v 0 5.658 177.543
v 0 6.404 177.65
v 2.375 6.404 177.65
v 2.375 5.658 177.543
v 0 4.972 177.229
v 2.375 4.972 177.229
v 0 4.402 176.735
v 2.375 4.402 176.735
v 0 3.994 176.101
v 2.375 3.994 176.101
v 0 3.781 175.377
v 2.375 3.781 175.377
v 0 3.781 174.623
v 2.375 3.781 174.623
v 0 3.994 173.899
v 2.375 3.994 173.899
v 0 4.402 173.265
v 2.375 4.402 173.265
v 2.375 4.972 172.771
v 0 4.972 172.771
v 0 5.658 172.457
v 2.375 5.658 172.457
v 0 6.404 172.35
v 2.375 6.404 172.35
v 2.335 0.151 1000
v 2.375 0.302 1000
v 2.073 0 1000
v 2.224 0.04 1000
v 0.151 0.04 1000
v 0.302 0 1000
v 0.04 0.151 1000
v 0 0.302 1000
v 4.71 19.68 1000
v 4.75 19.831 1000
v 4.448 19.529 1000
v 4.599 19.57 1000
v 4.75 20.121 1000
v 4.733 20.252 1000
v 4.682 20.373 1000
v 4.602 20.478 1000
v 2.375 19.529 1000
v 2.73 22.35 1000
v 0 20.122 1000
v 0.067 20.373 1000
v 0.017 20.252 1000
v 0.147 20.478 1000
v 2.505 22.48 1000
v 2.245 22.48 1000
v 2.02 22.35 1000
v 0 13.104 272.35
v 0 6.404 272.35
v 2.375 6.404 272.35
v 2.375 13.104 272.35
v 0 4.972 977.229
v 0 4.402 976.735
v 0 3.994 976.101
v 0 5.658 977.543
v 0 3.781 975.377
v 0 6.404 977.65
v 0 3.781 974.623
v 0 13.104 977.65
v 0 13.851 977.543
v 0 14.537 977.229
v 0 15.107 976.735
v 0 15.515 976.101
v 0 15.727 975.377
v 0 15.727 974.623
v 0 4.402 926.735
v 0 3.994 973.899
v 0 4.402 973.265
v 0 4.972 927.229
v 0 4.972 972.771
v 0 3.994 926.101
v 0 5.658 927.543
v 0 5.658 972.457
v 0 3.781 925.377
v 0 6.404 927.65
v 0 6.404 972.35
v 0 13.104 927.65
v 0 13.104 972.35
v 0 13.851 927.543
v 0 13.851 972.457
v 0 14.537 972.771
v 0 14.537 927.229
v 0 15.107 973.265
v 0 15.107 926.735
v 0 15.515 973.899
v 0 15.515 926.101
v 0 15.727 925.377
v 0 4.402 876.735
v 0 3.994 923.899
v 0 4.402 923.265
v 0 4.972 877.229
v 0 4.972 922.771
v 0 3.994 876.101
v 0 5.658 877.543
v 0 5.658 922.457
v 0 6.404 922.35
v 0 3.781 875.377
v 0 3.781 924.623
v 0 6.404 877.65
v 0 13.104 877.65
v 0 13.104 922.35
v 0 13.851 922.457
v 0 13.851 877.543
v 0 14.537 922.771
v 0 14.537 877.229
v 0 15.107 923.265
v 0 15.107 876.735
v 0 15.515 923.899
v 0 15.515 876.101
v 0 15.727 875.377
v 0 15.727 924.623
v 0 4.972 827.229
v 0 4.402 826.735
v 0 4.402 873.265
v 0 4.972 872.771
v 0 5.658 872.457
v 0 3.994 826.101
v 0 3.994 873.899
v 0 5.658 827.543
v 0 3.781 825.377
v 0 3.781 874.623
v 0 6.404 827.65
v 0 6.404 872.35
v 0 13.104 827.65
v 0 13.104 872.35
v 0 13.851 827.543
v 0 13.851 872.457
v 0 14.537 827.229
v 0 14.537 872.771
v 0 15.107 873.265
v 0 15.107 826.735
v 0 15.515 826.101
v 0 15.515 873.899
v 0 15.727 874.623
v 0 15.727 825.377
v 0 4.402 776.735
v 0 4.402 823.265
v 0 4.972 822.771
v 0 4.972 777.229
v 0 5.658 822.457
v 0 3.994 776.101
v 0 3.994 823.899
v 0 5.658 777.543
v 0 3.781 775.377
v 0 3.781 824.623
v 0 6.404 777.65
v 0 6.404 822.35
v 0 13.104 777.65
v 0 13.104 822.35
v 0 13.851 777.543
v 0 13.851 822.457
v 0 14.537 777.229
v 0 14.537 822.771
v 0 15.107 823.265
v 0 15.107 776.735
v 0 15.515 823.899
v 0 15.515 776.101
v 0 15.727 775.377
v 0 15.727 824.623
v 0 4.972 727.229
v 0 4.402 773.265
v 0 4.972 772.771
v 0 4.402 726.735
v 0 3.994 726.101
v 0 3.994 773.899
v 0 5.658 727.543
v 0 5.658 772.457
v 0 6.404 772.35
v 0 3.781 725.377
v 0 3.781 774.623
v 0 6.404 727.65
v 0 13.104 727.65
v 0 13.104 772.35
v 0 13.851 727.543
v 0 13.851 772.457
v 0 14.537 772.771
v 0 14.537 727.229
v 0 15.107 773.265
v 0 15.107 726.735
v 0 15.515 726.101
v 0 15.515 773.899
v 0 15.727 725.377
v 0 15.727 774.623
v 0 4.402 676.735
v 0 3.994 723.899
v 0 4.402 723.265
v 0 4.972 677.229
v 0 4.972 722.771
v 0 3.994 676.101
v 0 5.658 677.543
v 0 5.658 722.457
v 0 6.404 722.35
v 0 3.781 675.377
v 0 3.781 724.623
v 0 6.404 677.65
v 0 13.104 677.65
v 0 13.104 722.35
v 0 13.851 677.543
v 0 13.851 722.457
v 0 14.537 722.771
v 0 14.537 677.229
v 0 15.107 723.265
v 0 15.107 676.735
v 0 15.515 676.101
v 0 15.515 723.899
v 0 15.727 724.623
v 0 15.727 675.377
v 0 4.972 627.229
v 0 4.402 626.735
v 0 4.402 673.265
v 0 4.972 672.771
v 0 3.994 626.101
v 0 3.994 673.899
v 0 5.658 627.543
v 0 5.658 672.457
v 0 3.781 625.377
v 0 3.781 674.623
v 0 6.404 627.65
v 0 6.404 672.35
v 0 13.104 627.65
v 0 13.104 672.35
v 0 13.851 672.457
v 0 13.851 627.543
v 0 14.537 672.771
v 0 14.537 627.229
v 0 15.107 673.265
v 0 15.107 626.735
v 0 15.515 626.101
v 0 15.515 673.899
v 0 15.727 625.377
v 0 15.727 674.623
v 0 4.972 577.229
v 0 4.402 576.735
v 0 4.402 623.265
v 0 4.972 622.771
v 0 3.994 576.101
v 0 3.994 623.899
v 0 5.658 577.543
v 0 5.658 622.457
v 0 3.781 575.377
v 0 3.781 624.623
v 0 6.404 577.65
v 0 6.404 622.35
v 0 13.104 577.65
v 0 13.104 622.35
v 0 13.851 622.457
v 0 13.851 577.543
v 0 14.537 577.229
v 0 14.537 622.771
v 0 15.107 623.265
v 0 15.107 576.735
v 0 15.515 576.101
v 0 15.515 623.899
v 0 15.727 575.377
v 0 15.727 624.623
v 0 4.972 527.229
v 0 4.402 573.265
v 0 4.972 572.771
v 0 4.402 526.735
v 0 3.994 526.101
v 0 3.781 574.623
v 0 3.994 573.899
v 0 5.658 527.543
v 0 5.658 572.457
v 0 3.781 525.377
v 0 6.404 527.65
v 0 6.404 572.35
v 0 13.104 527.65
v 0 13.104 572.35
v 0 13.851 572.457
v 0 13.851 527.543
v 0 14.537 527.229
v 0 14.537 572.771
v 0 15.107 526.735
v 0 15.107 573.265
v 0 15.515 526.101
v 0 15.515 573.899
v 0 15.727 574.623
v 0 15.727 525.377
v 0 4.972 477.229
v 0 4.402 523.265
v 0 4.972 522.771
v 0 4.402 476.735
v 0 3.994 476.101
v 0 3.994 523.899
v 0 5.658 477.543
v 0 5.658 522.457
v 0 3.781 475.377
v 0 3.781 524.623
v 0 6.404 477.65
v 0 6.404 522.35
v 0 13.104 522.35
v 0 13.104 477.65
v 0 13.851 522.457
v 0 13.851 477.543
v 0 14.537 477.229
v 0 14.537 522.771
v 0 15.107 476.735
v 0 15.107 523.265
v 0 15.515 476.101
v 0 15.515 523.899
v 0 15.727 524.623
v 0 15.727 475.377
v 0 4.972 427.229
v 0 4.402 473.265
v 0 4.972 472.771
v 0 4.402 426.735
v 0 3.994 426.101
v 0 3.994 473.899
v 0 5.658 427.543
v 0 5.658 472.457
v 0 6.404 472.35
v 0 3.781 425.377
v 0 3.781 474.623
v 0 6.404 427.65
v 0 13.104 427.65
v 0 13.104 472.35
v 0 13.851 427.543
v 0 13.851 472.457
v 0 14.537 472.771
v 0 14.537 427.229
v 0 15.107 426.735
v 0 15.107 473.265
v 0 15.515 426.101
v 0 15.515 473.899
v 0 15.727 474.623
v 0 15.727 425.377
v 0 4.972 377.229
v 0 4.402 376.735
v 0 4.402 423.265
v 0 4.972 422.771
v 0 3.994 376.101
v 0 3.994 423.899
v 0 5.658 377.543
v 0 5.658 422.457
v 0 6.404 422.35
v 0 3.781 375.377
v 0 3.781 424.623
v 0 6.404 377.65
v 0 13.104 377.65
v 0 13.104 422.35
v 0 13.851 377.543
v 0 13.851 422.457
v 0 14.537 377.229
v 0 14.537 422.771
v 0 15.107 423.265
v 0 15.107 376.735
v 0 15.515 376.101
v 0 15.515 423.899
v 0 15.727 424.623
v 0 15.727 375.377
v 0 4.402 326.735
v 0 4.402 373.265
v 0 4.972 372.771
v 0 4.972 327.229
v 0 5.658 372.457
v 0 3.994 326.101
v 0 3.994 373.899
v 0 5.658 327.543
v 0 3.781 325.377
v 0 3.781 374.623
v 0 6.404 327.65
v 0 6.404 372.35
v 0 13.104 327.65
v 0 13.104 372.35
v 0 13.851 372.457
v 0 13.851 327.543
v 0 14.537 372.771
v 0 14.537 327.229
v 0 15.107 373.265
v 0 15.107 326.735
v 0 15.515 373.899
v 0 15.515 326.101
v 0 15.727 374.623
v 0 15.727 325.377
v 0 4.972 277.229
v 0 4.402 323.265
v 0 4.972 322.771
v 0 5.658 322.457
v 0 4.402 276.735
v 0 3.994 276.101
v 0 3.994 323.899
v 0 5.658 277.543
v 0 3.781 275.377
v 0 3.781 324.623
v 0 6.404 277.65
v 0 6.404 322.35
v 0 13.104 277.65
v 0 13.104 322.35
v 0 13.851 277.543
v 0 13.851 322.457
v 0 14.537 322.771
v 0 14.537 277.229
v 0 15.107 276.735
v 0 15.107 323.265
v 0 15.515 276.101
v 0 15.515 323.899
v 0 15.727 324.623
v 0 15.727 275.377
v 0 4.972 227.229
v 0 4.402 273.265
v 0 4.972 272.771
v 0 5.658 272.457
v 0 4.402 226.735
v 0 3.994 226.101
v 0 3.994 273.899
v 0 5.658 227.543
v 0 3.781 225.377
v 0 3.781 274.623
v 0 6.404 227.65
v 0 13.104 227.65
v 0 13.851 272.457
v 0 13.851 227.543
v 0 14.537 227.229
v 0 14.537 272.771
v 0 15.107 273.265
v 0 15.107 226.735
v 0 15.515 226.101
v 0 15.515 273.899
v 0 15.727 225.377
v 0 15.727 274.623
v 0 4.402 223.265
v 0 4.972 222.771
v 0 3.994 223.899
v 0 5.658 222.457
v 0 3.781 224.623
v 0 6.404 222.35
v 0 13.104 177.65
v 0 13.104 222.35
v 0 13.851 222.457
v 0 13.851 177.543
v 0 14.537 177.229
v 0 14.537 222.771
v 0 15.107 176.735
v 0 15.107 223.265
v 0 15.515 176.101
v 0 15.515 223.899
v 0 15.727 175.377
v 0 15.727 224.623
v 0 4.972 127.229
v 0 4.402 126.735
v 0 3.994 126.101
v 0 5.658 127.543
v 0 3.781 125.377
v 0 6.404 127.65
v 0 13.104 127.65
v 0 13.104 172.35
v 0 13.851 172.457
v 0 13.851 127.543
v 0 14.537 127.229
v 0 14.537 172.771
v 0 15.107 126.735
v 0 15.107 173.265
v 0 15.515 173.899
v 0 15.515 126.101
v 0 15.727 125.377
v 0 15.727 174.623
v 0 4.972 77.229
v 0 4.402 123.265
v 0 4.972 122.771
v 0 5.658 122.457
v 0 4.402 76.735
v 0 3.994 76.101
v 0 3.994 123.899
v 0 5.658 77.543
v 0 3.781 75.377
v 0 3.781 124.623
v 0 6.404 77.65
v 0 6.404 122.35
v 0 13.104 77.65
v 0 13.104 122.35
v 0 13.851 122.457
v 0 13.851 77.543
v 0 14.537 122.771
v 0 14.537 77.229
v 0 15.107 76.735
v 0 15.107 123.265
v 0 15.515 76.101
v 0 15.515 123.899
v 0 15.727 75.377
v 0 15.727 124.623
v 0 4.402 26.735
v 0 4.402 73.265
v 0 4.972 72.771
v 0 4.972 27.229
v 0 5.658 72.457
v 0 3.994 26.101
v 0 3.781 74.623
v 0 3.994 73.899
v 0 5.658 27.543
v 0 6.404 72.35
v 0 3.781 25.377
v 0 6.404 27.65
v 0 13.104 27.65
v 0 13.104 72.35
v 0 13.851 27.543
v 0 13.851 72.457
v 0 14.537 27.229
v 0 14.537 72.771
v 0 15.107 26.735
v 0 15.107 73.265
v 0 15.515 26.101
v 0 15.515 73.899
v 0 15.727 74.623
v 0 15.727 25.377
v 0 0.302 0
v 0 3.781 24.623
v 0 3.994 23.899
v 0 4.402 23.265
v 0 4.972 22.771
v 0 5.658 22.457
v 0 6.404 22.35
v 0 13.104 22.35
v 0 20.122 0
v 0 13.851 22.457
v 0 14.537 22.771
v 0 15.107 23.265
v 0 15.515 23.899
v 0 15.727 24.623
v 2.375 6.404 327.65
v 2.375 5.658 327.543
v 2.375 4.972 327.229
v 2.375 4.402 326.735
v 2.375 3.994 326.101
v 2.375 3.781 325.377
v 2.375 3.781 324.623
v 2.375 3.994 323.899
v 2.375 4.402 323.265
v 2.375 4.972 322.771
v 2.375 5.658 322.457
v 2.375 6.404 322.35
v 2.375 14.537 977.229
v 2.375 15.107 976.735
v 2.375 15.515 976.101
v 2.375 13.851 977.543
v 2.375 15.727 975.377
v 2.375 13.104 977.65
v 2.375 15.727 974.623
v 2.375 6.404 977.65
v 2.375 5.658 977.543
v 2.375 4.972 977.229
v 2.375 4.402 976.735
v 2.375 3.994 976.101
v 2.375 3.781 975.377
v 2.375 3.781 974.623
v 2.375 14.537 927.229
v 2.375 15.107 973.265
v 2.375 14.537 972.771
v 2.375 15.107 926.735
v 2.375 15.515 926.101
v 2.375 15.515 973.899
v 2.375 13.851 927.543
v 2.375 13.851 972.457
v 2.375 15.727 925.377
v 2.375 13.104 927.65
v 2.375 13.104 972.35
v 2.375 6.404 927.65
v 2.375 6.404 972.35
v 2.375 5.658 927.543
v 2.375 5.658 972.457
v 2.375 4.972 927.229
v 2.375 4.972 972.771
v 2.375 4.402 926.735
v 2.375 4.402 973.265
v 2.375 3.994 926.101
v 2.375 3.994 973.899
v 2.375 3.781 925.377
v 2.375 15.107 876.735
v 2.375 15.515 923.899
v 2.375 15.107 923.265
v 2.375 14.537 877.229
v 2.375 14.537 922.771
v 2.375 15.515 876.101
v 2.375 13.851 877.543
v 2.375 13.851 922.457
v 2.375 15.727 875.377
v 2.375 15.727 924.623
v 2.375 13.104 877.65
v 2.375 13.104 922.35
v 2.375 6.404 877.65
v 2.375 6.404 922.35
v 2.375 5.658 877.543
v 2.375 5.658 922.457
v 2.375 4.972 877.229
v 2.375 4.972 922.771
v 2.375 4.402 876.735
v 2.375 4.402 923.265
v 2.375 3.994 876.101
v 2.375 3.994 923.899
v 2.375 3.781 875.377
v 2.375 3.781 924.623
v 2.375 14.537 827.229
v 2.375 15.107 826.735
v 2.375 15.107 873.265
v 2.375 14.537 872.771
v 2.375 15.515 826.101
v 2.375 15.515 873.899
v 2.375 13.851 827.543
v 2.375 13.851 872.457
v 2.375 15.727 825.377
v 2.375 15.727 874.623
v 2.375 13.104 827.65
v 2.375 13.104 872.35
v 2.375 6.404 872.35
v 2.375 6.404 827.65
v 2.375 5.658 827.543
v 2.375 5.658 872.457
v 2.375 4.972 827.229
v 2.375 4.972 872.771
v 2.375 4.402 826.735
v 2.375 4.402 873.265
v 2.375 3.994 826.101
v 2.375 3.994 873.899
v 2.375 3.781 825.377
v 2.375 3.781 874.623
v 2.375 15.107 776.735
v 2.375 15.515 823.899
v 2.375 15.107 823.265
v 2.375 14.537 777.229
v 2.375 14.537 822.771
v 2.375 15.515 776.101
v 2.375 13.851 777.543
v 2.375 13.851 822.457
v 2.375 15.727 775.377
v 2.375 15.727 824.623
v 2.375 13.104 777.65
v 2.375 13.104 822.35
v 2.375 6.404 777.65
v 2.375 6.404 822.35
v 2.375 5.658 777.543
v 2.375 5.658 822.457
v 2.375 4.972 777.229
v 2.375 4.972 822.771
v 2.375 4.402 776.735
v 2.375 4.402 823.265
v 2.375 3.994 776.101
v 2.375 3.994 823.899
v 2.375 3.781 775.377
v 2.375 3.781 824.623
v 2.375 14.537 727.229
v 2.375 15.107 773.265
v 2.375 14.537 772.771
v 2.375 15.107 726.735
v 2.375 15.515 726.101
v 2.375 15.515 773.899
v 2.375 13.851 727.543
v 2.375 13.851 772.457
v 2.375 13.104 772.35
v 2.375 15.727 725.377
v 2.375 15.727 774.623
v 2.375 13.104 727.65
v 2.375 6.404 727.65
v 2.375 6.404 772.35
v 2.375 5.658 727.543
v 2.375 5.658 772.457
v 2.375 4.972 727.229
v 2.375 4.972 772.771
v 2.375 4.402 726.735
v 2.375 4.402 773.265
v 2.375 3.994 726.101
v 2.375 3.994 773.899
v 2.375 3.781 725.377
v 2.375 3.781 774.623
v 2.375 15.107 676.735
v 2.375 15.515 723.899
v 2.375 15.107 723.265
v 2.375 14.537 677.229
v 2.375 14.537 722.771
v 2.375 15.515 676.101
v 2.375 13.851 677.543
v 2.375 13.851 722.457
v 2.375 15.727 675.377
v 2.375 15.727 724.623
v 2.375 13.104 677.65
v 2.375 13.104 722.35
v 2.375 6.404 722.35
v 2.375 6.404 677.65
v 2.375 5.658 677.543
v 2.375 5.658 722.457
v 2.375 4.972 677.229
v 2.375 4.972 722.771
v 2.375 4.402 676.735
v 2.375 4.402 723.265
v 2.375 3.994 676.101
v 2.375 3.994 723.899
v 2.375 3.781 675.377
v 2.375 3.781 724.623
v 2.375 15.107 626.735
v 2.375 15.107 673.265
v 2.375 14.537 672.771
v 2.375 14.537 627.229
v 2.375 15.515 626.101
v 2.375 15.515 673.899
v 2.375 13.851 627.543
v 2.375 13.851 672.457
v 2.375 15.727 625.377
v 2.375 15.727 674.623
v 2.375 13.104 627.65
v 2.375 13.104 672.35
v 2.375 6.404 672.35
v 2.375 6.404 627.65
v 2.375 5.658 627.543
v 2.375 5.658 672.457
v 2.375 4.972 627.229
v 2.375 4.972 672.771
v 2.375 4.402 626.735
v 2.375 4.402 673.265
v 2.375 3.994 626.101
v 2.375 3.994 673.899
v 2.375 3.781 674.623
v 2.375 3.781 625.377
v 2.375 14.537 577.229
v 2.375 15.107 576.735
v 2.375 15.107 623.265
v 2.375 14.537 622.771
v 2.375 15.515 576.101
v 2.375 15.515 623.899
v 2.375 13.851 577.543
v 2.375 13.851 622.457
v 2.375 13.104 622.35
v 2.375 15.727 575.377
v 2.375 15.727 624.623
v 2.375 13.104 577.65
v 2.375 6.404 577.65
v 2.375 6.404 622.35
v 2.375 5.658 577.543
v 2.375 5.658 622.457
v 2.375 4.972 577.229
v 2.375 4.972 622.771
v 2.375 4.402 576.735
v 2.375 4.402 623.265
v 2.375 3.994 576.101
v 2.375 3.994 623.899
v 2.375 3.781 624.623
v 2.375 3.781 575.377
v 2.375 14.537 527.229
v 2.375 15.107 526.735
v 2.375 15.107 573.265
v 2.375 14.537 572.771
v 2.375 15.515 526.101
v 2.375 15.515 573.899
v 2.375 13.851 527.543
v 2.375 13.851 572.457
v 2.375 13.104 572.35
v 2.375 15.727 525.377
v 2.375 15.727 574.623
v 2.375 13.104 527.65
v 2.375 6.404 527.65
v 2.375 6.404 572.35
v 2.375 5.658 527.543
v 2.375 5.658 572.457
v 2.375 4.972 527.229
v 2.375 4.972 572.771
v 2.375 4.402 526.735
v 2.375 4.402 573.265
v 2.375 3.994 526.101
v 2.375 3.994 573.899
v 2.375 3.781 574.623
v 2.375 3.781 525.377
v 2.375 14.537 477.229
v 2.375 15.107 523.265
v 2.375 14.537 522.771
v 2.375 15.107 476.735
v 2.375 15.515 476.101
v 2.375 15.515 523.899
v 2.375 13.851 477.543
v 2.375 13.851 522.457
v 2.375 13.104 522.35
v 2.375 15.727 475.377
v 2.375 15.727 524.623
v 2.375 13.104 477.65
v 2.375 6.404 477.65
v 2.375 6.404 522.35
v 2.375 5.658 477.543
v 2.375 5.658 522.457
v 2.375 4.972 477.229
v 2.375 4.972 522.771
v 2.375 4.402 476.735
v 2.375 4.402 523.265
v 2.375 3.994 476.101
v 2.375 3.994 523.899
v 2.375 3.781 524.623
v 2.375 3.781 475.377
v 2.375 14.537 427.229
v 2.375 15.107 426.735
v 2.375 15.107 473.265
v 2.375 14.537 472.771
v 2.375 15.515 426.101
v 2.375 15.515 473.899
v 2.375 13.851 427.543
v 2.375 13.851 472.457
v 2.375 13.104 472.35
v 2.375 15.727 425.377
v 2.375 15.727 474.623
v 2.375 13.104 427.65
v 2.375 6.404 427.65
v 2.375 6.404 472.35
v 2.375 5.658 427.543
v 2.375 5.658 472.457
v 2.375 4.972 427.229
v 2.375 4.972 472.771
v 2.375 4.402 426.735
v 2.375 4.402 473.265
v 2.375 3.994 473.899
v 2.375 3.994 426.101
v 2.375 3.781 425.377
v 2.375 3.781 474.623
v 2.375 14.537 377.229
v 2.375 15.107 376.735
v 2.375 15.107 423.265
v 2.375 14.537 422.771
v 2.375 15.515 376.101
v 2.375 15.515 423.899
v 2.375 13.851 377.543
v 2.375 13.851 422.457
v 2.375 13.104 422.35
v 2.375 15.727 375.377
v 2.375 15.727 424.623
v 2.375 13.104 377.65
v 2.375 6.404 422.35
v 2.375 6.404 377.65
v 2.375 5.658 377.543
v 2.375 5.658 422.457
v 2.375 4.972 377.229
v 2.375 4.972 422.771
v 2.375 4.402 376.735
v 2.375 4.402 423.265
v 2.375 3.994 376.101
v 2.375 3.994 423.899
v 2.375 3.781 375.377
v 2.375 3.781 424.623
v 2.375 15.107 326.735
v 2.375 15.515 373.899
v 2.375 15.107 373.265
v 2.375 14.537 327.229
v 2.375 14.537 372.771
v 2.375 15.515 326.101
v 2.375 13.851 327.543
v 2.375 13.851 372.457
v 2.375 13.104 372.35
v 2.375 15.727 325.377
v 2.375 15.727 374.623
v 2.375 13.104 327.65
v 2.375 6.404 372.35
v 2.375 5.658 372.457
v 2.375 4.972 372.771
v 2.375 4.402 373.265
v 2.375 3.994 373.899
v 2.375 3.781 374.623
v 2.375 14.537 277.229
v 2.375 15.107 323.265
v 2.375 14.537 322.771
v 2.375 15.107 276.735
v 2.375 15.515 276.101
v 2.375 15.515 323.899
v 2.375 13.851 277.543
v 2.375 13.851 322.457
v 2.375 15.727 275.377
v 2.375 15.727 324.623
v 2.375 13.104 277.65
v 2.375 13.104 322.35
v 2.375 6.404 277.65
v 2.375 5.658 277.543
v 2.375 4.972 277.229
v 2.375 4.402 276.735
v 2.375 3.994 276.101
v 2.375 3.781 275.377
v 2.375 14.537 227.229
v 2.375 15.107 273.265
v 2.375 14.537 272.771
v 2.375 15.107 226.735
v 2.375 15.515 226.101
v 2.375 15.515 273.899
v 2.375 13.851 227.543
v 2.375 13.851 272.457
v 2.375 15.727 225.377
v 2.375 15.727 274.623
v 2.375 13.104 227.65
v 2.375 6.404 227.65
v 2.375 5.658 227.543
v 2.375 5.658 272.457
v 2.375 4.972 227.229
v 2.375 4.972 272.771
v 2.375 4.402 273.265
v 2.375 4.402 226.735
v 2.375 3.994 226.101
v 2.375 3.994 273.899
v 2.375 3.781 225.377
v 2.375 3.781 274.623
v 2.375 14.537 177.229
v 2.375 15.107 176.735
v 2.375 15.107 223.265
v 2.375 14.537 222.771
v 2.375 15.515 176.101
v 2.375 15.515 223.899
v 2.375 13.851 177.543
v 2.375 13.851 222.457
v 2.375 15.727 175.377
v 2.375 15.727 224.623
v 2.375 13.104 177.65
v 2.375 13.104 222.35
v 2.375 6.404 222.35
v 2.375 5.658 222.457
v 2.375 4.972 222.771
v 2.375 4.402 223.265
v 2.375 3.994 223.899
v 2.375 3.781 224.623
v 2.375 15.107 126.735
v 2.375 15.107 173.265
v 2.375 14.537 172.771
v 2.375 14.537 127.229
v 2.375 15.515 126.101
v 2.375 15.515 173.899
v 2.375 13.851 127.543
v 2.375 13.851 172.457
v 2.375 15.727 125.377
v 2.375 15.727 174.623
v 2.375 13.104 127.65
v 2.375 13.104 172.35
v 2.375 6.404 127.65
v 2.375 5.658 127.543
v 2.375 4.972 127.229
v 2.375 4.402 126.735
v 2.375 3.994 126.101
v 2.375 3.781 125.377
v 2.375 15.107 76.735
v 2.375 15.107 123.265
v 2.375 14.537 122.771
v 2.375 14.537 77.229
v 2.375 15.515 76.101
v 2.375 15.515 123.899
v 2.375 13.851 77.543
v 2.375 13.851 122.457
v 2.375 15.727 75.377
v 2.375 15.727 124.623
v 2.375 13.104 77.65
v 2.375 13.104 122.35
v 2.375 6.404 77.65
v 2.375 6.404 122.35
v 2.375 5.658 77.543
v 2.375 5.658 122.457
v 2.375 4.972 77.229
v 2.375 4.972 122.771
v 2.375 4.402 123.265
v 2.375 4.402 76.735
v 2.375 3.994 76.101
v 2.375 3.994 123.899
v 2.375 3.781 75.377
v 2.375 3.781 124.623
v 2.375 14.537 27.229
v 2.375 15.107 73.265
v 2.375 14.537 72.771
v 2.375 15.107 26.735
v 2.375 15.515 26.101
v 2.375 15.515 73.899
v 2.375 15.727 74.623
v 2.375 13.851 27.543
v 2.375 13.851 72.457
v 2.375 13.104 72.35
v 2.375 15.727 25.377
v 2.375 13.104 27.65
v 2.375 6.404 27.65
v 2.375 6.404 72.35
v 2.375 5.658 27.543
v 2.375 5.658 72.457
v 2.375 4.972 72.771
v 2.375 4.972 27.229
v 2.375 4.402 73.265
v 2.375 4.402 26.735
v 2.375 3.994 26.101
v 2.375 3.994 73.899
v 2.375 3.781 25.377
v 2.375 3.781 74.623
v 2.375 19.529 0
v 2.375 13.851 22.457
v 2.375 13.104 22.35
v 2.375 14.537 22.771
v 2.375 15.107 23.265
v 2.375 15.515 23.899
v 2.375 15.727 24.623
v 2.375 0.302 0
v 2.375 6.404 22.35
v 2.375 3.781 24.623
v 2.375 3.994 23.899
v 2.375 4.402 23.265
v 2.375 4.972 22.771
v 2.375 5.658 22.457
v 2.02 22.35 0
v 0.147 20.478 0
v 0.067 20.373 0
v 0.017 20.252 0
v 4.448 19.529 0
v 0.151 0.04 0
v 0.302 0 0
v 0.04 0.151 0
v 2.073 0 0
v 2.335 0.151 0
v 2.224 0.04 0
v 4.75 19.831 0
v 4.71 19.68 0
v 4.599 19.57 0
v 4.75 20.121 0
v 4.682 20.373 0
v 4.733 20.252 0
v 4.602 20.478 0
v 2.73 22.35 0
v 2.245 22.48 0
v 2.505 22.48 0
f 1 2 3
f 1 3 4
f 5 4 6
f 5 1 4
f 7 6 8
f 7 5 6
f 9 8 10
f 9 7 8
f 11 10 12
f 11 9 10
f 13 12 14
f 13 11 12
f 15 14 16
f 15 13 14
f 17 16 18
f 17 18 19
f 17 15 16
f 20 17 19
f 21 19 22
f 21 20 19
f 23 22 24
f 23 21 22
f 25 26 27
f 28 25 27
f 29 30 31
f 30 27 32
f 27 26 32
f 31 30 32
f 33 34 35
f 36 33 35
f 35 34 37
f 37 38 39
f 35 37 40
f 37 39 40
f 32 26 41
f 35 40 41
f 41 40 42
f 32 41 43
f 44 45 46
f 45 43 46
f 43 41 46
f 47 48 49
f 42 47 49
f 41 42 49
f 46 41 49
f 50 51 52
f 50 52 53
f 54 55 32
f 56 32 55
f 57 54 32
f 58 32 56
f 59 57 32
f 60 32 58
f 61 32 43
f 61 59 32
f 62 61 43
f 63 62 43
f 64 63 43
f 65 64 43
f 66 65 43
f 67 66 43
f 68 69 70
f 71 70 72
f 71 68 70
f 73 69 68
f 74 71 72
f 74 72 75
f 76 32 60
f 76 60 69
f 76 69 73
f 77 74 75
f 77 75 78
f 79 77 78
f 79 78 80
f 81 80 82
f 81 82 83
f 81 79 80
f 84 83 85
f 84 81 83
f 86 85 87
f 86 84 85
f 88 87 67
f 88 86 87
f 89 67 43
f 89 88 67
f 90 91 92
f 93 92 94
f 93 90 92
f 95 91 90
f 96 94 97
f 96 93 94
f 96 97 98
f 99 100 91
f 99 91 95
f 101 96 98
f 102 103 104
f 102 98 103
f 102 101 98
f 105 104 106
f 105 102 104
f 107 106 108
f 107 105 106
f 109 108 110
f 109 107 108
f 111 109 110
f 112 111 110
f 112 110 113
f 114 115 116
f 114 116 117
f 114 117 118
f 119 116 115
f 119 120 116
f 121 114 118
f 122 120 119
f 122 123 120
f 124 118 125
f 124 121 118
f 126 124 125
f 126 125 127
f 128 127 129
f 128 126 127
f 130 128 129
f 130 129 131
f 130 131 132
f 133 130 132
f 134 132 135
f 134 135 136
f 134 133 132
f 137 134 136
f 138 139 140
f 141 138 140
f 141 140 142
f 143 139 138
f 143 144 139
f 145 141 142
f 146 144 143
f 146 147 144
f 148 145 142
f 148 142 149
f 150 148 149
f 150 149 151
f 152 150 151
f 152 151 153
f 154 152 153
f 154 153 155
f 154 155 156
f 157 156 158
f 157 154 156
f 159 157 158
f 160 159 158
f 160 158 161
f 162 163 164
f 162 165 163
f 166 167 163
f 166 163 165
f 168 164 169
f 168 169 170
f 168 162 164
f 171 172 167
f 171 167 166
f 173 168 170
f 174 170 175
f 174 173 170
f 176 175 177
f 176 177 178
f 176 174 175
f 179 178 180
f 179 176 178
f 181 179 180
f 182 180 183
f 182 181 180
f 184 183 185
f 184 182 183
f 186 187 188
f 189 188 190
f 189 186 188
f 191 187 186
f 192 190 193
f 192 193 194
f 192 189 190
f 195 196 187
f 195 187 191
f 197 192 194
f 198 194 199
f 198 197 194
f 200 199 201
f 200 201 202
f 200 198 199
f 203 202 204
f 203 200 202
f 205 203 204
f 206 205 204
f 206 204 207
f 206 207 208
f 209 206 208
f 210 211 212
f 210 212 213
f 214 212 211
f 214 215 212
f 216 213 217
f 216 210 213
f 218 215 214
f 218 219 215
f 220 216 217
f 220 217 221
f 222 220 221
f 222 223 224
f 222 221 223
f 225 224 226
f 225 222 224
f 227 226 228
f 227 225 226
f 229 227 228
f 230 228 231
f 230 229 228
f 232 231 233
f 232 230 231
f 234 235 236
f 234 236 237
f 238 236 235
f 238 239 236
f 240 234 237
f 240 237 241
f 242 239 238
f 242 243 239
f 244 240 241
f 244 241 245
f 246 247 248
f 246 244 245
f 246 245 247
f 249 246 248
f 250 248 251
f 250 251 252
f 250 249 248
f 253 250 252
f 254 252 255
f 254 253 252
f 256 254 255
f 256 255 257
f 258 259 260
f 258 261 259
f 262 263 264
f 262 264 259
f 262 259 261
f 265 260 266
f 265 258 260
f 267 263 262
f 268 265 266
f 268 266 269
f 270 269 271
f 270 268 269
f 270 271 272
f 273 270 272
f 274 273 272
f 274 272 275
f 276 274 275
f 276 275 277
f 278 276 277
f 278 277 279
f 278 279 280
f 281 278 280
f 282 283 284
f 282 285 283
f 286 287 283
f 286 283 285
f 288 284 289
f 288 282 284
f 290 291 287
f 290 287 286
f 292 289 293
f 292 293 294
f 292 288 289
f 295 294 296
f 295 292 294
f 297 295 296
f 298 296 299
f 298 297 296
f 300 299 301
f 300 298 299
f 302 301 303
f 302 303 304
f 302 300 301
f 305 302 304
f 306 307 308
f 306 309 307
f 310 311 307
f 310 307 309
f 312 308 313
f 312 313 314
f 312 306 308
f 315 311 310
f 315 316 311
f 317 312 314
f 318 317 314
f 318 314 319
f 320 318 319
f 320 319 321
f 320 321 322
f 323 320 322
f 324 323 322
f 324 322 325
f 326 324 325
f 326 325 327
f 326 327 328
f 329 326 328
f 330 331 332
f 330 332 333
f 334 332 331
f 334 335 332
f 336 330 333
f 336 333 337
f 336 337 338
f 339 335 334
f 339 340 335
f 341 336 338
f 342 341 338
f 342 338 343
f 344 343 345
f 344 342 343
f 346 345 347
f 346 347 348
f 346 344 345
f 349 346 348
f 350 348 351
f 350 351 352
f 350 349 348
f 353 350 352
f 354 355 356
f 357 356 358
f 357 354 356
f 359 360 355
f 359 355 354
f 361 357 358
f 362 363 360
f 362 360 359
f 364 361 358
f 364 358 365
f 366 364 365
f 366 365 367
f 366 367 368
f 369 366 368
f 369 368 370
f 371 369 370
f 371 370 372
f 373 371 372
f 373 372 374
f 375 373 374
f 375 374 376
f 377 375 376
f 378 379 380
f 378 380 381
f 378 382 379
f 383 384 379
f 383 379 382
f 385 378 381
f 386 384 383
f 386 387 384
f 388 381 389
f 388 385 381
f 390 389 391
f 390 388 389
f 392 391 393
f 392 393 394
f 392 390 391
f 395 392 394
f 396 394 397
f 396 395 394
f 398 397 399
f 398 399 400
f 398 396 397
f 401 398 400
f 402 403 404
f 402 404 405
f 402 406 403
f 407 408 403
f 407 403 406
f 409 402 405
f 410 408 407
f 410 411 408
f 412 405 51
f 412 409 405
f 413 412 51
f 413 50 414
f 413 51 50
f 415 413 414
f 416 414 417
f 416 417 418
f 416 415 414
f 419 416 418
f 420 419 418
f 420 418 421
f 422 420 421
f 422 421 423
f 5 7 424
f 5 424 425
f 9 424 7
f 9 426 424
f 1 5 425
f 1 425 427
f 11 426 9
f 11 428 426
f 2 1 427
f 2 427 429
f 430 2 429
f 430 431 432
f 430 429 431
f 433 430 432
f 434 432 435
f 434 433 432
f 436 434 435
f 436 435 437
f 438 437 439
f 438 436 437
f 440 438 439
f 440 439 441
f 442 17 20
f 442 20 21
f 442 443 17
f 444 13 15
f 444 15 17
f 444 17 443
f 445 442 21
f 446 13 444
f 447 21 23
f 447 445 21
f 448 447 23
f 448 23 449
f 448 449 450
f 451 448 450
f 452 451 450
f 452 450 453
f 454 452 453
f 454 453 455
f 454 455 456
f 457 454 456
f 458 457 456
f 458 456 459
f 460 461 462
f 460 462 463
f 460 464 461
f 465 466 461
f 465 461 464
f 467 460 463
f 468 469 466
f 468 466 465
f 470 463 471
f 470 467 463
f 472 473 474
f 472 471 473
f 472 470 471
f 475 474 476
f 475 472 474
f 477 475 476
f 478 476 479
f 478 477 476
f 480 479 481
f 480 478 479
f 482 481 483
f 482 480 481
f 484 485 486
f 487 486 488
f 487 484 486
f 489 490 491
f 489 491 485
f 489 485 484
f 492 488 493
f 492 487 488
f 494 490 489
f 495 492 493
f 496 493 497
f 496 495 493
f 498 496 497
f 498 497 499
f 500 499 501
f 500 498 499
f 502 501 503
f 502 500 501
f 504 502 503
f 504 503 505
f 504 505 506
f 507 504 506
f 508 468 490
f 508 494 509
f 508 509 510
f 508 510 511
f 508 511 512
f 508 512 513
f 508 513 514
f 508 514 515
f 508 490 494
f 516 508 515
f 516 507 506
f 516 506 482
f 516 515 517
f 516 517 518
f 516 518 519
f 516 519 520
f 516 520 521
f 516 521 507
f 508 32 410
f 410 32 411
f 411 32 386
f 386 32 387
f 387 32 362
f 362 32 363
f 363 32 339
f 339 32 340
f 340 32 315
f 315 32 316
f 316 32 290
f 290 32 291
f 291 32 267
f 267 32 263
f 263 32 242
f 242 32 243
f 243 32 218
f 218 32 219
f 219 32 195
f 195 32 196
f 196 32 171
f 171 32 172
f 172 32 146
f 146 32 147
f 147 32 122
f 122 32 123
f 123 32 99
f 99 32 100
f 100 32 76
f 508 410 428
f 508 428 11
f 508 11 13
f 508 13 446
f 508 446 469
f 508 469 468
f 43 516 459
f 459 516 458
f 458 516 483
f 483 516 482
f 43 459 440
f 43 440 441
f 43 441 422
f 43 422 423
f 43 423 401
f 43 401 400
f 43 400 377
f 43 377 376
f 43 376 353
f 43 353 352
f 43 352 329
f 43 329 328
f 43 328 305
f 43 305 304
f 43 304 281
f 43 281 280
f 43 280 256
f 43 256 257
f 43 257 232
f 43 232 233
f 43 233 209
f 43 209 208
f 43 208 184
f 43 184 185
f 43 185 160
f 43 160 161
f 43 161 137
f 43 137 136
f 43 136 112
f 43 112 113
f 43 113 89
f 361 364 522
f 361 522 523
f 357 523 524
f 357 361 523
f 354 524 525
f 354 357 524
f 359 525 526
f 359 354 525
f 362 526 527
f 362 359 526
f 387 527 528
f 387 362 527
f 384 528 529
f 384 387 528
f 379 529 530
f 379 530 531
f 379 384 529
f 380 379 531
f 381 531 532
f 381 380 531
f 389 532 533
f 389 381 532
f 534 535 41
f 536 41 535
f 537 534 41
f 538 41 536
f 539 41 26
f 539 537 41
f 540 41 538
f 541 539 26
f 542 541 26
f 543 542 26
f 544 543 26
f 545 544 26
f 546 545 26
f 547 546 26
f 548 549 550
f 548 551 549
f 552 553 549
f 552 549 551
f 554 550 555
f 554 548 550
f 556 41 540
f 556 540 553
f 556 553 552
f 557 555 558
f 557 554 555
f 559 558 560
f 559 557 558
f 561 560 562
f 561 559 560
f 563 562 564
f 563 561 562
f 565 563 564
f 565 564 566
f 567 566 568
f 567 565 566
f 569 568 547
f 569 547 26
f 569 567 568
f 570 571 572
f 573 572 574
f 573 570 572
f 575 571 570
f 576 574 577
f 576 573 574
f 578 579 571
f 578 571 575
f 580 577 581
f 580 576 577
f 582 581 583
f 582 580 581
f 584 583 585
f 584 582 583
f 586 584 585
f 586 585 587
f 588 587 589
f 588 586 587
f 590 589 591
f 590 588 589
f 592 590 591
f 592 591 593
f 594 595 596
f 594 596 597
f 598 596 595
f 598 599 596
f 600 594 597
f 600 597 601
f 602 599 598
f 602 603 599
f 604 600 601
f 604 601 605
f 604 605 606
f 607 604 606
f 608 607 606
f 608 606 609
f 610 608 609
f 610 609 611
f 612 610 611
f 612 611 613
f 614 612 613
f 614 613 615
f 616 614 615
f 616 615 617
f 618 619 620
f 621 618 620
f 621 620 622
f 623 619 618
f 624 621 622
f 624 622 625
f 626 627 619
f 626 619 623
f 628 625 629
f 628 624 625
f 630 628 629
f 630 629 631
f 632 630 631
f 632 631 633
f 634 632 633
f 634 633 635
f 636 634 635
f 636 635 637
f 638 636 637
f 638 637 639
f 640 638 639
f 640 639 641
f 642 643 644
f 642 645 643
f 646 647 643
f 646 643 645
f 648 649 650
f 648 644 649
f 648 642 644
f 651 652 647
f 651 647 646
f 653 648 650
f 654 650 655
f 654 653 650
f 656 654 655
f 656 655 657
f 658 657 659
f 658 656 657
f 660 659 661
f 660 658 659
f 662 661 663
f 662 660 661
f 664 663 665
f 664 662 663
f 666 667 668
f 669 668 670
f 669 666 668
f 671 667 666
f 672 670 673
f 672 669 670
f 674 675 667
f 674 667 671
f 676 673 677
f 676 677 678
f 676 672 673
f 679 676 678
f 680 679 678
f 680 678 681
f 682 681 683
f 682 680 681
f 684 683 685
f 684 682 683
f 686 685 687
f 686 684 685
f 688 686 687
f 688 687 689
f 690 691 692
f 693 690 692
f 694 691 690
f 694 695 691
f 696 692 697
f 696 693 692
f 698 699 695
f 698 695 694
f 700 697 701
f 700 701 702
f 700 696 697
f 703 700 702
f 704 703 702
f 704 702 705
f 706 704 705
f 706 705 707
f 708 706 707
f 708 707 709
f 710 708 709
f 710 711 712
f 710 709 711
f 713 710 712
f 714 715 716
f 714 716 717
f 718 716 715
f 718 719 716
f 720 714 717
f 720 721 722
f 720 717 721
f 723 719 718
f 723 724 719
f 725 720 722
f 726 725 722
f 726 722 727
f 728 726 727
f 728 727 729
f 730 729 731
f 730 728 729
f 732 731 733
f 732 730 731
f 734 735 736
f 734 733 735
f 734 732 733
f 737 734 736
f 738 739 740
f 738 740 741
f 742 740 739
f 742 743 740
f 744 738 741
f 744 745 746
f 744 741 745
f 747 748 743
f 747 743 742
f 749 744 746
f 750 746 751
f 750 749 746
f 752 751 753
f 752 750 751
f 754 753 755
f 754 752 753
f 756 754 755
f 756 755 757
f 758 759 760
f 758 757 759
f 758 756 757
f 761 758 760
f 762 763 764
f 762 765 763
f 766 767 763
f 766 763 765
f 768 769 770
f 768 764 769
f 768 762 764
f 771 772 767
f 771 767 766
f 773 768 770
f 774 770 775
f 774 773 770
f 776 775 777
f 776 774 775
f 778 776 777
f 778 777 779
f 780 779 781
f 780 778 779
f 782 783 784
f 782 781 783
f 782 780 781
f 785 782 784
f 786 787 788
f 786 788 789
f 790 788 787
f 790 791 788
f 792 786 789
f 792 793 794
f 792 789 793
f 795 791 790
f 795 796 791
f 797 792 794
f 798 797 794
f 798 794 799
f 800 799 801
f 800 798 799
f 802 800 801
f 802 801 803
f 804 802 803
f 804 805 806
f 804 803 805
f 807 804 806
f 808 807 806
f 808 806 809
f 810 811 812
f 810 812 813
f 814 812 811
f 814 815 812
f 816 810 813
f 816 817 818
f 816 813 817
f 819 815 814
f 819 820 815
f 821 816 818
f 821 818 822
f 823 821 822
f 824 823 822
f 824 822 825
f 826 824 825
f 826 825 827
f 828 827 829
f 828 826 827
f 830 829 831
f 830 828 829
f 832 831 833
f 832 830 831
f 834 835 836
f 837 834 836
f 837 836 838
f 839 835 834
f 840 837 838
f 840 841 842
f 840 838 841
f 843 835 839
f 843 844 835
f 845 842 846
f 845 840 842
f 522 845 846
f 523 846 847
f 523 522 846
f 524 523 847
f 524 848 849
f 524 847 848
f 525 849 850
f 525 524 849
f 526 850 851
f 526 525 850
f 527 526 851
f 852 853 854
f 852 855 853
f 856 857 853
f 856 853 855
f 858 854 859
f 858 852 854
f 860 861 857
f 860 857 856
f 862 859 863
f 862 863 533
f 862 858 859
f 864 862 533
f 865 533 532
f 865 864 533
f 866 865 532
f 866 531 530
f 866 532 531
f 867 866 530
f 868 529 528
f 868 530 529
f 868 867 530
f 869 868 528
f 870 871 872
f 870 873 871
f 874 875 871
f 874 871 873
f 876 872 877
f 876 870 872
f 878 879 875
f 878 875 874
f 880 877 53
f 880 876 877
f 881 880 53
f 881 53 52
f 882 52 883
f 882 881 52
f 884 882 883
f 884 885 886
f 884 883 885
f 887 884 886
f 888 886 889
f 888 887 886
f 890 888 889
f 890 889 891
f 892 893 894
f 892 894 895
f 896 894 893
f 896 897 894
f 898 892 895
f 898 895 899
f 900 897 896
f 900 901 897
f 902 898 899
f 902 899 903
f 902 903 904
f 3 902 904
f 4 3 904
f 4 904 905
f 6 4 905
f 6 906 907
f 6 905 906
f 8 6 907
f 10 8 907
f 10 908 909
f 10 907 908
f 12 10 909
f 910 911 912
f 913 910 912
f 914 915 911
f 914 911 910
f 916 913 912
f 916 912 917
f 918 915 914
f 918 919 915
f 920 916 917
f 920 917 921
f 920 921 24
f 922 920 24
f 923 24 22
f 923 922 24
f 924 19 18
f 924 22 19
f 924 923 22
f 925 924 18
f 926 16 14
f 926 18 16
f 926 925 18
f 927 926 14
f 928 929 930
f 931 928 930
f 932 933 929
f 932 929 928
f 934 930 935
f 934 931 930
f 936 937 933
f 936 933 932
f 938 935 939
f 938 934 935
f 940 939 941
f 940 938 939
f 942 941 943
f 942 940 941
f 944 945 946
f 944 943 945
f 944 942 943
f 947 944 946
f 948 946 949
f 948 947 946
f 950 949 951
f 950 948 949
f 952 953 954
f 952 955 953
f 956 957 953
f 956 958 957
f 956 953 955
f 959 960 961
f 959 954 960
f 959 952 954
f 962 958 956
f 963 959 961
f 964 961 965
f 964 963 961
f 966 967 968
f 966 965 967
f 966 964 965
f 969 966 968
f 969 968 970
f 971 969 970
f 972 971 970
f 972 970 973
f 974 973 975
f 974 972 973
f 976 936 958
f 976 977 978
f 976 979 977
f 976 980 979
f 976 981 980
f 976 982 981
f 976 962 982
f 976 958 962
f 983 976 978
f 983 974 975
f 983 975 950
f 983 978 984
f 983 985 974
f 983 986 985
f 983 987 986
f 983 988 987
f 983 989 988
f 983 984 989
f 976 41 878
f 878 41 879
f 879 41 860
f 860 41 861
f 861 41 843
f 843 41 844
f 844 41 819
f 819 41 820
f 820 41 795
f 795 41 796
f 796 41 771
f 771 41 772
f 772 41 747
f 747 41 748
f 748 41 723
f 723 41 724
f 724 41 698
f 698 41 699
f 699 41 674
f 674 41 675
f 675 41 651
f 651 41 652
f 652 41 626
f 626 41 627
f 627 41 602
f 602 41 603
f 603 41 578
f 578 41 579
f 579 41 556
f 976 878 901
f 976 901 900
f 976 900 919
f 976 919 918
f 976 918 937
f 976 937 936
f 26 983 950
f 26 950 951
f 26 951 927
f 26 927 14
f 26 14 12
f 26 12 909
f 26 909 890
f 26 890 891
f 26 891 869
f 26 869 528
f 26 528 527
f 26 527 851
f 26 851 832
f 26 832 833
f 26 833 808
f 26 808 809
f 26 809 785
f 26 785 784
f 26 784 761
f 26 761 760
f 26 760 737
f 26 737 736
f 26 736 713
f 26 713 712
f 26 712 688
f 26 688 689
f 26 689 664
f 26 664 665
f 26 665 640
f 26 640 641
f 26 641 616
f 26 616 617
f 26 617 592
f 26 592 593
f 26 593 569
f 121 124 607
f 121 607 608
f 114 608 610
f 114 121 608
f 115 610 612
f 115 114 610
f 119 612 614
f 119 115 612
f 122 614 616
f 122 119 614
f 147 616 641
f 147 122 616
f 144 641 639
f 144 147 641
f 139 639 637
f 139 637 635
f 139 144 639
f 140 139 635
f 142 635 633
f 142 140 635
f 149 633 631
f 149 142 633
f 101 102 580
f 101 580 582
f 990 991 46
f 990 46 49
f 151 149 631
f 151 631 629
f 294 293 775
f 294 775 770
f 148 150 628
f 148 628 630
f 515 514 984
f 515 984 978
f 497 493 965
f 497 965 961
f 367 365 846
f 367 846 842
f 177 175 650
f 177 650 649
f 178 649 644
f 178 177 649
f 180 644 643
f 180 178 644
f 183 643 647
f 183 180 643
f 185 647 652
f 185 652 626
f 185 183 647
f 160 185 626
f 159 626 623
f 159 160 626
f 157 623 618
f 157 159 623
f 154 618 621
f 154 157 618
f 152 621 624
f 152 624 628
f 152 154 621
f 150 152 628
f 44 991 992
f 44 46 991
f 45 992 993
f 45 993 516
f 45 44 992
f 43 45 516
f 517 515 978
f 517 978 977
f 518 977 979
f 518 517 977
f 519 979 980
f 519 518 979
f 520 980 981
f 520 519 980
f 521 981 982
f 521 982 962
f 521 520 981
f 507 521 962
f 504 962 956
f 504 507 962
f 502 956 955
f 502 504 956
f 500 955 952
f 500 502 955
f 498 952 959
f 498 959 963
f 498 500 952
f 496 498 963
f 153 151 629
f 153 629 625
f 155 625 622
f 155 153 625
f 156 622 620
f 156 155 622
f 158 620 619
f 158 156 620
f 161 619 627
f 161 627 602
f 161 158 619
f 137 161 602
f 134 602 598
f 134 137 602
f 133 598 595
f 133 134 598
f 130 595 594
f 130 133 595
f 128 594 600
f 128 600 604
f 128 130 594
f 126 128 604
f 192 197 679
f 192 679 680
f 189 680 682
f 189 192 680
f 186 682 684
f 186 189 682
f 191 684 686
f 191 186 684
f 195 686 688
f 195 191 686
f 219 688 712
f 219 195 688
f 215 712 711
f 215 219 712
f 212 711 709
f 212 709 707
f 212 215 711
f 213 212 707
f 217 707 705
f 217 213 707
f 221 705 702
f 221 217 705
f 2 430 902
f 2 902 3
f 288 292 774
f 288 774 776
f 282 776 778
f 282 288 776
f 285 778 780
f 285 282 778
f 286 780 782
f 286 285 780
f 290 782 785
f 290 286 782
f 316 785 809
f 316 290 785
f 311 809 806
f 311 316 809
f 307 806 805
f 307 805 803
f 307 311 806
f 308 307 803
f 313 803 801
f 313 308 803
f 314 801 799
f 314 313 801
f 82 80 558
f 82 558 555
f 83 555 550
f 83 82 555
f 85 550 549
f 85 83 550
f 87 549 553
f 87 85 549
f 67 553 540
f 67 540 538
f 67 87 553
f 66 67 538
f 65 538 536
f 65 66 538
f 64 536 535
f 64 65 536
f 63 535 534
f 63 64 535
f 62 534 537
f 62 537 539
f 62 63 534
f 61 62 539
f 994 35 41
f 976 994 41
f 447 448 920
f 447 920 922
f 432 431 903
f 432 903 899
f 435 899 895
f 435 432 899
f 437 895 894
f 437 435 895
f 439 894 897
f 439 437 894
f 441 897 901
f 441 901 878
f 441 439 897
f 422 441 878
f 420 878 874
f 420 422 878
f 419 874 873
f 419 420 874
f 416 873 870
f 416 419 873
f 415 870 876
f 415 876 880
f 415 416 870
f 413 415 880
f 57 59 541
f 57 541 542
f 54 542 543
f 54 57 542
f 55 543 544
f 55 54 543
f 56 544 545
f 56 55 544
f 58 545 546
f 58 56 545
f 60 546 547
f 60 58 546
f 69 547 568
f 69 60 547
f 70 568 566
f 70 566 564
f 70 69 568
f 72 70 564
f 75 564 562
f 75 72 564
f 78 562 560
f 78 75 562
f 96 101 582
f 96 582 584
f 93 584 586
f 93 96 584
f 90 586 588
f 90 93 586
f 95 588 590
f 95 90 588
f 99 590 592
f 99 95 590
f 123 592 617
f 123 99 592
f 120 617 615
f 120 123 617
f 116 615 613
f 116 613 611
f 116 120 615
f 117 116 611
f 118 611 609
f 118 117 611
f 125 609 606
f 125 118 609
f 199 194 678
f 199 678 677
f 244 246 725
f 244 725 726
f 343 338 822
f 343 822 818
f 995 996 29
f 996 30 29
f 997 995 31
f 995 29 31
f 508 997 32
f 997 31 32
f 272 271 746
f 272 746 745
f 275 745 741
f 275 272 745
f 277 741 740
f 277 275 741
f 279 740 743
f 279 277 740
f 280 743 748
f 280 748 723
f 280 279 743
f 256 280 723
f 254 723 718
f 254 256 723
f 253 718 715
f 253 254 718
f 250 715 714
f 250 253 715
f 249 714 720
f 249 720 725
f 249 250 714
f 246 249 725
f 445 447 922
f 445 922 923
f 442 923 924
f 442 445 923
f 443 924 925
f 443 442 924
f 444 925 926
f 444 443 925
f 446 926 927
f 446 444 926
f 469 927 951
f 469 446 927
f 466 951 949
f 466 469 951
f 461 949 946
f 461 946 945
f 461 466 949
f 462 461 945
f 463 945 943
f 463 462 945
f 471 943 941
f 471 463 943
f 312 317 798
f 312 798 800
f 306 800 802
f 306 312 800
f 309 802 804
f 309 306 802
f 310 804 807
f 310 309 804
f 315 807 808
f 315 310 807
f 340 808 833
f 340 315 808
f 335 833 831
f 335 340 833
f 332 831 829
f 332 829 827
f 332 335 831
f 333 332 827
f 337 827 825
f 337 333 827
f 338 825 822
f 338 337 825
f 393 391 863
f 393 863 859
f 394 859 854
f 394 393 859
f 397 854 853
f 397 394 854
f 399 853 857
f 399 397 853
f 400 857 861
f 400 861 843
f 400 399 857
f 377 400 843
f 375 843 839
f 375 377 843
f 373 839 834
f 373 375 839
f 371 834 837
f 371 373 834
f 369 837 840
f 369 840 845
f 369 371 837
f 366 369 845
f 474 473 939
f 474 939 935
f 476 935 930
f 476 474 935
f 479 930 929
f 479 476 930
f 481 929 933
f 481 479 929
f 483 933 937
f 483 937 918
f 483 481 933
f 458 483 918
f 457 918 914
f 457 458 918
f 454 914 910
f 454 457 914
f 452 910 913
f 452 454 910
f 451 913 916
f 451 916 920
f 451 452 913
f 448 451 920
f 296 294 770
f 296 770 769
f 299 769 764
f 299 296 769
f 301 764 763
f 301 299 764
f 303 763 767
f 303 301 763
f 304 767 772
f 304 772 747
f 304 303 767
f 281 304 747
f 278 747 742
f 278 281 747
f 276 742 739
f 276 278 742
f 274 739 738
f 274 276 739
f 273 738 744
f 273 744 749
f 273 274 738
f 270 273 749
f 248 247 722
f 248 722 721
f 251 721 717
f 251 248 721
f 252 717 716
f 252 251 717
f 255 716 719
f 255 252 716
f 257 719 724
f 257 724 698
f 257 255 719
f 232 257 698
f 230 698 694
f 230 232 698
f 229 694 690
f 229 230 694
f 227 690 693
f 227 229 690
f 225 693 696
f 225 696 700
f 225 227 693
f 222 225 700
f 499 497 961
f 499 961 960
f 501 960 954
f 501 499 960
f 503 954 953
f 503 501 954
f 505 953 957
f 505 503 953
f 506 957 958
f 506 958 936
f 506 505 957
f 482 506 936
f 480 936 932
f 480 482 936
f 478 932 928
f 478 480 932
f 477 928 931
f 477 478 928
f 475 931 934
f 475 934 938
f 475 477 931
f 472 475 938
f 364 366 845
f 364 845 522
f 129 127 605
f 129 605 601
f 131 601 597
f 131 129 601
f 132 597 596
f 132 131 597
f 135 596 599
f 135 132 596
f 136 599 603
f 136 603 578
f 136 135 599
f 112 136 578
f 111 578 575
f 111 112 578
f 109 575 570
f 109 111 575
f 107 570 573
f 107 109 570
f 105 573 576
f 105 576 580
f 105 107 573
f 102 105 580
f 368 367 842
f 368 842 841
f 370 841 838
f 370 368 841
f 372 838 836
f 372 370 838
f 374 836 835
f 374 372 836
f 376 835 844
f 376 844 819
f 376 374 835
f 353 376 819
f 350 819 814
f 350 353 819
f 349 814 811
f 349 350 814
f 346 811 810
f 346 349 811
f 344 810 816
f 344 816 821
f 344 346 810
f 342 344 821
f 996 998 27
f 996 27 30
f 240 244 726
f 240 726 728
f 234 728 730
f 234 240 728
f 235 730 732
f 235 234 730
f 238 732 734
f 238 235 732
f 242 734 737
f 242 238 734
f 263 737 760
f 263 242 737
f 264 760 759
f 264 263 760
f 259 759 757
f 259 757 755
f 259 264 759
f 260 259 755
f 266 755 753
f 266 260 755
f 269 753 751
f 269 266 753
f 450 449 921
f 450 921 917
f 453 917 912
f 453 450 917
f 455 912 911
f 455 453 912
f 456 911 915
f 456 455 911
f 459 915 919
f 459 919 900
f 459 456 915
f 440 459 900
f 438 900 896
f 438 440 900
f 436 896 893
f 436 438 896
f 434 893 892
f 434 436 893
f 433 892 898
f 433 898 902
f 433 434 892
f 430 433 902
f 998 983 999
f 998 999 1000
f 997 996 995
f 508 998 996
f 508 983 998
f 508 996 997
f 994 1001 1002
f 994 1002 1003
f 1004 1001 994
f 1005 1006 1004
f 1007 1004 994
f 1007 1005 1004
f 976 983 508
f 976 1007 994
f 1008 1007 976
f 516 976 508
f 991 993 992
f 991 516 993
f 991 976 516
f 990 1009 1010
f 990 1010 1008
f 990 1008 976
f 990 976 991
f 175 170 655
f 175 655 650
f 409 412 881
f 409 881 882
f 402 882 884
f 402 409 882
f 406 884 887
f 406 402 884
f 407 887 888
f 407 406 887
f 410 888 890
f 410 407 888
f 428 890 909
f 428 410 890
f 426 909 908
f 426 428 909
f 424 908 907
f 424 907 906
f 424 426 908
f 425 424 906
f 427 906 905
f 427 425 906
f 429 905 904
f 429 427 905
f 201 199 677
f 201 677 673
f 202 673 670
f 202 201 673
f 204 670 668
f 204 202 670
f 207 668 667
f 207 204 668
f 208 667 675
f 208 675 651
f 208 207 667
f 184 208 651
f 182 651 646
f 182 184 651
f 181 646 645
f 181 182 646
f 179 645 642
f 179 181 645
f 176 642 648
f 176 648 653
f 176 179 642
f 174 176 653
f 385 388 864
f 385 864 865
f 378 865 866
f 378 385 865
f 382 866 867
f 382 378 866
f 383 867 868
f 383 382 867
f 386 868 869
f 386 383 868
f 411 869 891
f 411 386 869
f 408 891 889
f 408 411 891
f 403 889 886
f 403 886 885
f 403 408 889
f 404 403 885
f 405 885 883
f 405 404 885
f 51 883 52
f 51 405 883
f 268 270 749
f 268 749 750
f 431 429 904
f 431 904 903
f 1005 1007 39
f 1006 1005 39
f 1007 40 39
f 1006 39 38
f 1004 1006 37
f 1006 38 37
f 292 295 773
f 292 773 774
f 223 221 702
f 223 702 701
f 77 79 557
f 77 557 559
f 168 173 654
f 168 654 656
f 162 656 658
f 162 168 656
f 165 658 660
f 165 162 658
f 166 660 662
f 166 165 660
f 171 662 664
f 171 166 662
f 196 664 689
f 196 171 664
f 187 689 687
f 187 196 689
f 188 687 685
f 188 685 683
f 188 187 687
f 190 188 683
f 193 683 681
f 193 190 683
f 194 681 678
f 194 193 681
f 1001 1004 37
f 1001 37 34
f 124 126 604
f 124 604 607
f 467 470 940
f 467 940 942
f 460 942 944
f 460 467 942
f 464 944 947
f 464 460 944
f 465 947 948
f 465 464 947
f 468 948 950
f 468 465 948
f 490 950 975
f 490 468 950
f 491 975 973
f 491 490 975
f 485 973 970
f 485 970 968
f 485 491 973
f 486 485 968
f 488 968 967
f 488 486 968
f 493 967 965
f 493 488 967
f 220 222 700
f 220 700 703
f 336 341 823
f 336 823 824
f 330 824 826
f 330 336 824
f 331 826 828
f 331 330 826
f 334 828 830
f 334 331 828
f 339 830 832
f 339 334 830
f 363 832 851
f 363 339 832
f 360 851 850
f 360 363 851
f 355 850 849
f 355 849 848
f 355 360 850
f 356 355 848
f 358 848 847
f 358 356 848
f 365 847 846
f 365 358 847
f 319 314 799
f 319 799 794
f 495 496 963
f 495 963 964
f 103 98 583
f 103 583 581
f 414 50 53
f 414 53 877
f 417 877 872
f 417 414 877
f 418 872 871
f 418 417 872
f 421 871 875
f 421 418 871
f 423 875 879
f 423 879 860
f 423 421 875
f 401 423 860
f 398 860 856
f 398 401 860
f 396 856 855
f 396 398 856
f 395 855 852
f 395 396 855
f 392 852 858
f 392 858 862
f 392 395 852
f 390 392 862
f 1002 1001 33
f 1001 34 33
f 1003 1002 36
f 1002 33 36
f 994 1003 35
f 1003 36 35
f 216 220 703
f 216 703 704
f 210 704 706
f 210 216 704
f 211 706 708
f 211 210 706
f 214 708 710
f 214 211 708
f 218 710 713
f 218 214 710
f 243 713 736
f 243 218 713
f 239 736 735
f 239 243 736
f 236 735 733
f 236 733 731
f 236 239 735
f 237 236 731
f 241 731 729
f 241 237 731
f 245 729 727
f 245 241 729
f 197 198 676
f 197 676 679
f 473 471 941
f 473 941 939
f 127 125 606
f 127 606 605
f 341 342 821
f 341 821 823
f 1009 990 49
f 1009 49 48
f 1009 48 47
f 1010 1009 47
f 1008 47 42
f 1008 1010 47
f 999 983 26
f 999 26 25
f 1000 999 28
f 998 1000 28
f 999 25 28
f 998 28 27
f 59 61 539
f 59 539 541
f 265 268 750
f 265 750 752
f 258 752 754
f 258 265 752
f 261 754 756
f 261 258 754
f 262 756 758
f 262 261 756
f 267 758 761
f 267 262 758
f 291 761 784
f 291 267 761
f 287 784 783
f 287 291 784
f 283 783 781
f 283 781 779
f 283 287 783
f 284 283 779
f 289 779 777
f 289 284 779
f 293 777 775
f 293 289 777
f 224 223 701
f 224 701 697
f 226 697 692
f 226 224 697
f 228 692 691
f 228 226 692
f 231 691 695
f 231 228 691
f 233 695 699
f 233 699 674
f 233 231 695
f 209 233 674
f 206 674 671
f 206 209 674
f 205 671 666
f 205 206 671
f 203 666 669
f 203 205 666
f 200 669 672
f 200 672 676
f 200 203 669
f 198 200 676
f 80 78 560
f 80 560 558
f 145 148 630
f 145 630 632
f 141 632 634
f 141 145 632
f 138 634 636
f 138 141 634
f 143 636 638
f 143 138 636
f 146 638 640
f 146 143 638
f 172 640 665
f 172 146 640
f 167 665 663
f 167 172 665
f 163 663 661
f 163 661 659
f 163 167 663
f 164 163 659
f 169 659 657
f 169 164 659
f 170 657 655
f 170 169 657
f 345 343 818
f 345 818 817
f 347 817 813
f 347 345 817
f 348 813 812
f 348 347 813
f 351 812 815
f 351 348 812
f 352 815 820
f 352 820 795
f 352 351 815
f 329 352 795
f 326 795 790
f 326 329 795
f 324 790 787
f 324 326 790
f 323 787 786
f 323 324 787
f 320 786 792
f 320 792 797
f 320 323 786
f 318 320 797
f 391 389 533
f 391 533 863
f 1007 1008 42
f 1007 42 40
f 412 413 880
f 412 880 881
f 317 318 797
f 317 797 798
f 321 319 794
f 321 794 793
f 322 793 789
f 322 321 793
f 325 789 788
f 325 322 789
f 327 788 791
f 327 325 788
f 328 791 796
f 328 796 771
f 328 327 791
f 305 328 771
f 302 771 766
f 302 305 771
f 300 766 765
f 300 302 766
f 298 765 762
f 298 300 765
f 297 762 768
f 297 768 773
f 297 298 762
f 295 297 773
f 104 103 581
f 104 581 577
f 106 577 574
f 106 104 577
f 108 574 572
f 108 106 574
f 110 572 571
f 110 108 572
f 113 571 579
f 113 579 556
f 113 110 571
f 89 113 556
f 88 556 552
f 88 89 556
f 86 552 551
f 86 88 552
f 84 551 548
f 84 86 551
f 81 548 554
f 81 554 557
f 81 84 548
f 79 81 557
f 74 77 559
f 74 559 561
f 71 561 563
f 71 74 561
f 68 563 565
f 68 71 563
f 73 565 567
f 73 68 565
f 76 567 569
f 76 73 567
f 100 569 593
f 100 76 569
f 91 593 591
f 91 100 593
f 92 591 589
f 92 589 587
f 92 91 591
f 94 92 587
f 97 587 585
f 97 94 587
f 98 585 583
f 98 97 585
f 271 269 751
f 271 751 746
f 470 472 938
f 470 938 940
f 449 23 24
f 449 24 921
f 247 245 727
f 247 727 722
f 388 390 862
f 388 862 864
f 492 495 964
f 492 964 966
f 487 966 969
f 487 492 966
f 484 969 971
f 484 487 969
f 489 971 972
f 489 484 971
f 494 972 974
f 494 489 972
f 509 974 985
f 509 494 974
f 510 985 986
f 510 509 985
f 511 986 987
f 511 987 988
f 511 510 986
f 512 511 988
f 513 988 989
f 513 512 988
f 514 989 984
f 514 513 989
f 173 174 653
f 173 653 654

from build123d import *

# Parameters (mm, degrees)
BOSS_EXTRUDE1_DEPTH = 1000
FILLET1_R           = 0.50329666
FILLET2_R           = 0.50398302
FILLET3_R           = 0.30157619
FILLET4_R           = 0.30157551
CUT_EXTRUDE1_DEPTH  = 2.375
LPATTERN1_COUNT     = 20
LPATTERN1_PITCH     = 50


with BuildPart() as part:
    # Sketch1 → Boss-Extrude1 (new body)
    with BuildSketch(Plane.XY):
        with BuildLine():
            Line((0, 20.330194912), (2.019589054, 22.349783966))
            ThreePointArc((2.019589054, 22.349783966), (2.375, 22.497), (2.730410946, 22.349783966))
            Line((2.730410946, 22.349783966), (4.75, 20.330194912))
            Line((4.75, 20.330194912), (4.75, 19.5291))
            Line((4.75, 19.5291), (2.375, 19.5291))
            Line((2.375, 19.5291), (2.375, 0))
            Line((2.375, 0), (0, 0))
            Line((0, 0), (0, 20.330194912))
        make_face()
    extrude(amount=BOSS_EXTRUDE1_DEPTH)

    # Fillet1
    fillet1_edges = [part.edges().sort_by_distance(p)[0] for p in [
        (0, 20.330194912, 500),
    ]]
    fillet(fillet1_edges, radius=FILLET1_R)

    # Fillet2
    fillet2_edges = [part.edges().sort_by_distance(p)[0] for p in [
        (4.75, 20.330194912, 500),
    ]]
    fillet(fillet2_edges, radius=FILLET2_R)

    # Fillet3
    fillet3_edges = [part.edges().sort_by_distance(p)[0] for p in [
        (4.75, 19.5291, 500),
    ]]
    fillet(fillet3_edges, radius=FILLET3_R)

    # Fillet4
    fillet4_edges = [part.edges().sort_by_distance(p)[0] for p in [
        (2.375, 0, 500),
        (0, 0, 500),
    ]]
    fillet(fillet4_edges, radius=FILLET4_R)

    # Sketch2 → Cut-Extrude1 (cut)
    with BuildSketch(Plane.ZY):
        with BuildLine():
            Line((27.65, 13.1043), (27.65, 6.4043))
            ThreePointArc((27.65, 6.4043), (25, 3.7543), (22.35, 6.4043))
            Line((22.35, 6.4043), (22.35, 13.1043))
            ThreePointArc((22.35, 13.1043), (25, 15.7543), (27.65, 13.1043))
        make_face()
    cut_extrude1 = extrude(amount=-CUT_EXTRUDE1_DEPTH, mode=Mode.SUBTRACT)

    # LPattern1: Cut-Extrude1 ×20
    with Locations(*[(0, 0, i * LPATTERN1_PITCH) for i in range(1, LPATTERN1_COUNT)]):
        add(cut_extrude1, mode=Mode.SUBTRACT)


solid = part.part
